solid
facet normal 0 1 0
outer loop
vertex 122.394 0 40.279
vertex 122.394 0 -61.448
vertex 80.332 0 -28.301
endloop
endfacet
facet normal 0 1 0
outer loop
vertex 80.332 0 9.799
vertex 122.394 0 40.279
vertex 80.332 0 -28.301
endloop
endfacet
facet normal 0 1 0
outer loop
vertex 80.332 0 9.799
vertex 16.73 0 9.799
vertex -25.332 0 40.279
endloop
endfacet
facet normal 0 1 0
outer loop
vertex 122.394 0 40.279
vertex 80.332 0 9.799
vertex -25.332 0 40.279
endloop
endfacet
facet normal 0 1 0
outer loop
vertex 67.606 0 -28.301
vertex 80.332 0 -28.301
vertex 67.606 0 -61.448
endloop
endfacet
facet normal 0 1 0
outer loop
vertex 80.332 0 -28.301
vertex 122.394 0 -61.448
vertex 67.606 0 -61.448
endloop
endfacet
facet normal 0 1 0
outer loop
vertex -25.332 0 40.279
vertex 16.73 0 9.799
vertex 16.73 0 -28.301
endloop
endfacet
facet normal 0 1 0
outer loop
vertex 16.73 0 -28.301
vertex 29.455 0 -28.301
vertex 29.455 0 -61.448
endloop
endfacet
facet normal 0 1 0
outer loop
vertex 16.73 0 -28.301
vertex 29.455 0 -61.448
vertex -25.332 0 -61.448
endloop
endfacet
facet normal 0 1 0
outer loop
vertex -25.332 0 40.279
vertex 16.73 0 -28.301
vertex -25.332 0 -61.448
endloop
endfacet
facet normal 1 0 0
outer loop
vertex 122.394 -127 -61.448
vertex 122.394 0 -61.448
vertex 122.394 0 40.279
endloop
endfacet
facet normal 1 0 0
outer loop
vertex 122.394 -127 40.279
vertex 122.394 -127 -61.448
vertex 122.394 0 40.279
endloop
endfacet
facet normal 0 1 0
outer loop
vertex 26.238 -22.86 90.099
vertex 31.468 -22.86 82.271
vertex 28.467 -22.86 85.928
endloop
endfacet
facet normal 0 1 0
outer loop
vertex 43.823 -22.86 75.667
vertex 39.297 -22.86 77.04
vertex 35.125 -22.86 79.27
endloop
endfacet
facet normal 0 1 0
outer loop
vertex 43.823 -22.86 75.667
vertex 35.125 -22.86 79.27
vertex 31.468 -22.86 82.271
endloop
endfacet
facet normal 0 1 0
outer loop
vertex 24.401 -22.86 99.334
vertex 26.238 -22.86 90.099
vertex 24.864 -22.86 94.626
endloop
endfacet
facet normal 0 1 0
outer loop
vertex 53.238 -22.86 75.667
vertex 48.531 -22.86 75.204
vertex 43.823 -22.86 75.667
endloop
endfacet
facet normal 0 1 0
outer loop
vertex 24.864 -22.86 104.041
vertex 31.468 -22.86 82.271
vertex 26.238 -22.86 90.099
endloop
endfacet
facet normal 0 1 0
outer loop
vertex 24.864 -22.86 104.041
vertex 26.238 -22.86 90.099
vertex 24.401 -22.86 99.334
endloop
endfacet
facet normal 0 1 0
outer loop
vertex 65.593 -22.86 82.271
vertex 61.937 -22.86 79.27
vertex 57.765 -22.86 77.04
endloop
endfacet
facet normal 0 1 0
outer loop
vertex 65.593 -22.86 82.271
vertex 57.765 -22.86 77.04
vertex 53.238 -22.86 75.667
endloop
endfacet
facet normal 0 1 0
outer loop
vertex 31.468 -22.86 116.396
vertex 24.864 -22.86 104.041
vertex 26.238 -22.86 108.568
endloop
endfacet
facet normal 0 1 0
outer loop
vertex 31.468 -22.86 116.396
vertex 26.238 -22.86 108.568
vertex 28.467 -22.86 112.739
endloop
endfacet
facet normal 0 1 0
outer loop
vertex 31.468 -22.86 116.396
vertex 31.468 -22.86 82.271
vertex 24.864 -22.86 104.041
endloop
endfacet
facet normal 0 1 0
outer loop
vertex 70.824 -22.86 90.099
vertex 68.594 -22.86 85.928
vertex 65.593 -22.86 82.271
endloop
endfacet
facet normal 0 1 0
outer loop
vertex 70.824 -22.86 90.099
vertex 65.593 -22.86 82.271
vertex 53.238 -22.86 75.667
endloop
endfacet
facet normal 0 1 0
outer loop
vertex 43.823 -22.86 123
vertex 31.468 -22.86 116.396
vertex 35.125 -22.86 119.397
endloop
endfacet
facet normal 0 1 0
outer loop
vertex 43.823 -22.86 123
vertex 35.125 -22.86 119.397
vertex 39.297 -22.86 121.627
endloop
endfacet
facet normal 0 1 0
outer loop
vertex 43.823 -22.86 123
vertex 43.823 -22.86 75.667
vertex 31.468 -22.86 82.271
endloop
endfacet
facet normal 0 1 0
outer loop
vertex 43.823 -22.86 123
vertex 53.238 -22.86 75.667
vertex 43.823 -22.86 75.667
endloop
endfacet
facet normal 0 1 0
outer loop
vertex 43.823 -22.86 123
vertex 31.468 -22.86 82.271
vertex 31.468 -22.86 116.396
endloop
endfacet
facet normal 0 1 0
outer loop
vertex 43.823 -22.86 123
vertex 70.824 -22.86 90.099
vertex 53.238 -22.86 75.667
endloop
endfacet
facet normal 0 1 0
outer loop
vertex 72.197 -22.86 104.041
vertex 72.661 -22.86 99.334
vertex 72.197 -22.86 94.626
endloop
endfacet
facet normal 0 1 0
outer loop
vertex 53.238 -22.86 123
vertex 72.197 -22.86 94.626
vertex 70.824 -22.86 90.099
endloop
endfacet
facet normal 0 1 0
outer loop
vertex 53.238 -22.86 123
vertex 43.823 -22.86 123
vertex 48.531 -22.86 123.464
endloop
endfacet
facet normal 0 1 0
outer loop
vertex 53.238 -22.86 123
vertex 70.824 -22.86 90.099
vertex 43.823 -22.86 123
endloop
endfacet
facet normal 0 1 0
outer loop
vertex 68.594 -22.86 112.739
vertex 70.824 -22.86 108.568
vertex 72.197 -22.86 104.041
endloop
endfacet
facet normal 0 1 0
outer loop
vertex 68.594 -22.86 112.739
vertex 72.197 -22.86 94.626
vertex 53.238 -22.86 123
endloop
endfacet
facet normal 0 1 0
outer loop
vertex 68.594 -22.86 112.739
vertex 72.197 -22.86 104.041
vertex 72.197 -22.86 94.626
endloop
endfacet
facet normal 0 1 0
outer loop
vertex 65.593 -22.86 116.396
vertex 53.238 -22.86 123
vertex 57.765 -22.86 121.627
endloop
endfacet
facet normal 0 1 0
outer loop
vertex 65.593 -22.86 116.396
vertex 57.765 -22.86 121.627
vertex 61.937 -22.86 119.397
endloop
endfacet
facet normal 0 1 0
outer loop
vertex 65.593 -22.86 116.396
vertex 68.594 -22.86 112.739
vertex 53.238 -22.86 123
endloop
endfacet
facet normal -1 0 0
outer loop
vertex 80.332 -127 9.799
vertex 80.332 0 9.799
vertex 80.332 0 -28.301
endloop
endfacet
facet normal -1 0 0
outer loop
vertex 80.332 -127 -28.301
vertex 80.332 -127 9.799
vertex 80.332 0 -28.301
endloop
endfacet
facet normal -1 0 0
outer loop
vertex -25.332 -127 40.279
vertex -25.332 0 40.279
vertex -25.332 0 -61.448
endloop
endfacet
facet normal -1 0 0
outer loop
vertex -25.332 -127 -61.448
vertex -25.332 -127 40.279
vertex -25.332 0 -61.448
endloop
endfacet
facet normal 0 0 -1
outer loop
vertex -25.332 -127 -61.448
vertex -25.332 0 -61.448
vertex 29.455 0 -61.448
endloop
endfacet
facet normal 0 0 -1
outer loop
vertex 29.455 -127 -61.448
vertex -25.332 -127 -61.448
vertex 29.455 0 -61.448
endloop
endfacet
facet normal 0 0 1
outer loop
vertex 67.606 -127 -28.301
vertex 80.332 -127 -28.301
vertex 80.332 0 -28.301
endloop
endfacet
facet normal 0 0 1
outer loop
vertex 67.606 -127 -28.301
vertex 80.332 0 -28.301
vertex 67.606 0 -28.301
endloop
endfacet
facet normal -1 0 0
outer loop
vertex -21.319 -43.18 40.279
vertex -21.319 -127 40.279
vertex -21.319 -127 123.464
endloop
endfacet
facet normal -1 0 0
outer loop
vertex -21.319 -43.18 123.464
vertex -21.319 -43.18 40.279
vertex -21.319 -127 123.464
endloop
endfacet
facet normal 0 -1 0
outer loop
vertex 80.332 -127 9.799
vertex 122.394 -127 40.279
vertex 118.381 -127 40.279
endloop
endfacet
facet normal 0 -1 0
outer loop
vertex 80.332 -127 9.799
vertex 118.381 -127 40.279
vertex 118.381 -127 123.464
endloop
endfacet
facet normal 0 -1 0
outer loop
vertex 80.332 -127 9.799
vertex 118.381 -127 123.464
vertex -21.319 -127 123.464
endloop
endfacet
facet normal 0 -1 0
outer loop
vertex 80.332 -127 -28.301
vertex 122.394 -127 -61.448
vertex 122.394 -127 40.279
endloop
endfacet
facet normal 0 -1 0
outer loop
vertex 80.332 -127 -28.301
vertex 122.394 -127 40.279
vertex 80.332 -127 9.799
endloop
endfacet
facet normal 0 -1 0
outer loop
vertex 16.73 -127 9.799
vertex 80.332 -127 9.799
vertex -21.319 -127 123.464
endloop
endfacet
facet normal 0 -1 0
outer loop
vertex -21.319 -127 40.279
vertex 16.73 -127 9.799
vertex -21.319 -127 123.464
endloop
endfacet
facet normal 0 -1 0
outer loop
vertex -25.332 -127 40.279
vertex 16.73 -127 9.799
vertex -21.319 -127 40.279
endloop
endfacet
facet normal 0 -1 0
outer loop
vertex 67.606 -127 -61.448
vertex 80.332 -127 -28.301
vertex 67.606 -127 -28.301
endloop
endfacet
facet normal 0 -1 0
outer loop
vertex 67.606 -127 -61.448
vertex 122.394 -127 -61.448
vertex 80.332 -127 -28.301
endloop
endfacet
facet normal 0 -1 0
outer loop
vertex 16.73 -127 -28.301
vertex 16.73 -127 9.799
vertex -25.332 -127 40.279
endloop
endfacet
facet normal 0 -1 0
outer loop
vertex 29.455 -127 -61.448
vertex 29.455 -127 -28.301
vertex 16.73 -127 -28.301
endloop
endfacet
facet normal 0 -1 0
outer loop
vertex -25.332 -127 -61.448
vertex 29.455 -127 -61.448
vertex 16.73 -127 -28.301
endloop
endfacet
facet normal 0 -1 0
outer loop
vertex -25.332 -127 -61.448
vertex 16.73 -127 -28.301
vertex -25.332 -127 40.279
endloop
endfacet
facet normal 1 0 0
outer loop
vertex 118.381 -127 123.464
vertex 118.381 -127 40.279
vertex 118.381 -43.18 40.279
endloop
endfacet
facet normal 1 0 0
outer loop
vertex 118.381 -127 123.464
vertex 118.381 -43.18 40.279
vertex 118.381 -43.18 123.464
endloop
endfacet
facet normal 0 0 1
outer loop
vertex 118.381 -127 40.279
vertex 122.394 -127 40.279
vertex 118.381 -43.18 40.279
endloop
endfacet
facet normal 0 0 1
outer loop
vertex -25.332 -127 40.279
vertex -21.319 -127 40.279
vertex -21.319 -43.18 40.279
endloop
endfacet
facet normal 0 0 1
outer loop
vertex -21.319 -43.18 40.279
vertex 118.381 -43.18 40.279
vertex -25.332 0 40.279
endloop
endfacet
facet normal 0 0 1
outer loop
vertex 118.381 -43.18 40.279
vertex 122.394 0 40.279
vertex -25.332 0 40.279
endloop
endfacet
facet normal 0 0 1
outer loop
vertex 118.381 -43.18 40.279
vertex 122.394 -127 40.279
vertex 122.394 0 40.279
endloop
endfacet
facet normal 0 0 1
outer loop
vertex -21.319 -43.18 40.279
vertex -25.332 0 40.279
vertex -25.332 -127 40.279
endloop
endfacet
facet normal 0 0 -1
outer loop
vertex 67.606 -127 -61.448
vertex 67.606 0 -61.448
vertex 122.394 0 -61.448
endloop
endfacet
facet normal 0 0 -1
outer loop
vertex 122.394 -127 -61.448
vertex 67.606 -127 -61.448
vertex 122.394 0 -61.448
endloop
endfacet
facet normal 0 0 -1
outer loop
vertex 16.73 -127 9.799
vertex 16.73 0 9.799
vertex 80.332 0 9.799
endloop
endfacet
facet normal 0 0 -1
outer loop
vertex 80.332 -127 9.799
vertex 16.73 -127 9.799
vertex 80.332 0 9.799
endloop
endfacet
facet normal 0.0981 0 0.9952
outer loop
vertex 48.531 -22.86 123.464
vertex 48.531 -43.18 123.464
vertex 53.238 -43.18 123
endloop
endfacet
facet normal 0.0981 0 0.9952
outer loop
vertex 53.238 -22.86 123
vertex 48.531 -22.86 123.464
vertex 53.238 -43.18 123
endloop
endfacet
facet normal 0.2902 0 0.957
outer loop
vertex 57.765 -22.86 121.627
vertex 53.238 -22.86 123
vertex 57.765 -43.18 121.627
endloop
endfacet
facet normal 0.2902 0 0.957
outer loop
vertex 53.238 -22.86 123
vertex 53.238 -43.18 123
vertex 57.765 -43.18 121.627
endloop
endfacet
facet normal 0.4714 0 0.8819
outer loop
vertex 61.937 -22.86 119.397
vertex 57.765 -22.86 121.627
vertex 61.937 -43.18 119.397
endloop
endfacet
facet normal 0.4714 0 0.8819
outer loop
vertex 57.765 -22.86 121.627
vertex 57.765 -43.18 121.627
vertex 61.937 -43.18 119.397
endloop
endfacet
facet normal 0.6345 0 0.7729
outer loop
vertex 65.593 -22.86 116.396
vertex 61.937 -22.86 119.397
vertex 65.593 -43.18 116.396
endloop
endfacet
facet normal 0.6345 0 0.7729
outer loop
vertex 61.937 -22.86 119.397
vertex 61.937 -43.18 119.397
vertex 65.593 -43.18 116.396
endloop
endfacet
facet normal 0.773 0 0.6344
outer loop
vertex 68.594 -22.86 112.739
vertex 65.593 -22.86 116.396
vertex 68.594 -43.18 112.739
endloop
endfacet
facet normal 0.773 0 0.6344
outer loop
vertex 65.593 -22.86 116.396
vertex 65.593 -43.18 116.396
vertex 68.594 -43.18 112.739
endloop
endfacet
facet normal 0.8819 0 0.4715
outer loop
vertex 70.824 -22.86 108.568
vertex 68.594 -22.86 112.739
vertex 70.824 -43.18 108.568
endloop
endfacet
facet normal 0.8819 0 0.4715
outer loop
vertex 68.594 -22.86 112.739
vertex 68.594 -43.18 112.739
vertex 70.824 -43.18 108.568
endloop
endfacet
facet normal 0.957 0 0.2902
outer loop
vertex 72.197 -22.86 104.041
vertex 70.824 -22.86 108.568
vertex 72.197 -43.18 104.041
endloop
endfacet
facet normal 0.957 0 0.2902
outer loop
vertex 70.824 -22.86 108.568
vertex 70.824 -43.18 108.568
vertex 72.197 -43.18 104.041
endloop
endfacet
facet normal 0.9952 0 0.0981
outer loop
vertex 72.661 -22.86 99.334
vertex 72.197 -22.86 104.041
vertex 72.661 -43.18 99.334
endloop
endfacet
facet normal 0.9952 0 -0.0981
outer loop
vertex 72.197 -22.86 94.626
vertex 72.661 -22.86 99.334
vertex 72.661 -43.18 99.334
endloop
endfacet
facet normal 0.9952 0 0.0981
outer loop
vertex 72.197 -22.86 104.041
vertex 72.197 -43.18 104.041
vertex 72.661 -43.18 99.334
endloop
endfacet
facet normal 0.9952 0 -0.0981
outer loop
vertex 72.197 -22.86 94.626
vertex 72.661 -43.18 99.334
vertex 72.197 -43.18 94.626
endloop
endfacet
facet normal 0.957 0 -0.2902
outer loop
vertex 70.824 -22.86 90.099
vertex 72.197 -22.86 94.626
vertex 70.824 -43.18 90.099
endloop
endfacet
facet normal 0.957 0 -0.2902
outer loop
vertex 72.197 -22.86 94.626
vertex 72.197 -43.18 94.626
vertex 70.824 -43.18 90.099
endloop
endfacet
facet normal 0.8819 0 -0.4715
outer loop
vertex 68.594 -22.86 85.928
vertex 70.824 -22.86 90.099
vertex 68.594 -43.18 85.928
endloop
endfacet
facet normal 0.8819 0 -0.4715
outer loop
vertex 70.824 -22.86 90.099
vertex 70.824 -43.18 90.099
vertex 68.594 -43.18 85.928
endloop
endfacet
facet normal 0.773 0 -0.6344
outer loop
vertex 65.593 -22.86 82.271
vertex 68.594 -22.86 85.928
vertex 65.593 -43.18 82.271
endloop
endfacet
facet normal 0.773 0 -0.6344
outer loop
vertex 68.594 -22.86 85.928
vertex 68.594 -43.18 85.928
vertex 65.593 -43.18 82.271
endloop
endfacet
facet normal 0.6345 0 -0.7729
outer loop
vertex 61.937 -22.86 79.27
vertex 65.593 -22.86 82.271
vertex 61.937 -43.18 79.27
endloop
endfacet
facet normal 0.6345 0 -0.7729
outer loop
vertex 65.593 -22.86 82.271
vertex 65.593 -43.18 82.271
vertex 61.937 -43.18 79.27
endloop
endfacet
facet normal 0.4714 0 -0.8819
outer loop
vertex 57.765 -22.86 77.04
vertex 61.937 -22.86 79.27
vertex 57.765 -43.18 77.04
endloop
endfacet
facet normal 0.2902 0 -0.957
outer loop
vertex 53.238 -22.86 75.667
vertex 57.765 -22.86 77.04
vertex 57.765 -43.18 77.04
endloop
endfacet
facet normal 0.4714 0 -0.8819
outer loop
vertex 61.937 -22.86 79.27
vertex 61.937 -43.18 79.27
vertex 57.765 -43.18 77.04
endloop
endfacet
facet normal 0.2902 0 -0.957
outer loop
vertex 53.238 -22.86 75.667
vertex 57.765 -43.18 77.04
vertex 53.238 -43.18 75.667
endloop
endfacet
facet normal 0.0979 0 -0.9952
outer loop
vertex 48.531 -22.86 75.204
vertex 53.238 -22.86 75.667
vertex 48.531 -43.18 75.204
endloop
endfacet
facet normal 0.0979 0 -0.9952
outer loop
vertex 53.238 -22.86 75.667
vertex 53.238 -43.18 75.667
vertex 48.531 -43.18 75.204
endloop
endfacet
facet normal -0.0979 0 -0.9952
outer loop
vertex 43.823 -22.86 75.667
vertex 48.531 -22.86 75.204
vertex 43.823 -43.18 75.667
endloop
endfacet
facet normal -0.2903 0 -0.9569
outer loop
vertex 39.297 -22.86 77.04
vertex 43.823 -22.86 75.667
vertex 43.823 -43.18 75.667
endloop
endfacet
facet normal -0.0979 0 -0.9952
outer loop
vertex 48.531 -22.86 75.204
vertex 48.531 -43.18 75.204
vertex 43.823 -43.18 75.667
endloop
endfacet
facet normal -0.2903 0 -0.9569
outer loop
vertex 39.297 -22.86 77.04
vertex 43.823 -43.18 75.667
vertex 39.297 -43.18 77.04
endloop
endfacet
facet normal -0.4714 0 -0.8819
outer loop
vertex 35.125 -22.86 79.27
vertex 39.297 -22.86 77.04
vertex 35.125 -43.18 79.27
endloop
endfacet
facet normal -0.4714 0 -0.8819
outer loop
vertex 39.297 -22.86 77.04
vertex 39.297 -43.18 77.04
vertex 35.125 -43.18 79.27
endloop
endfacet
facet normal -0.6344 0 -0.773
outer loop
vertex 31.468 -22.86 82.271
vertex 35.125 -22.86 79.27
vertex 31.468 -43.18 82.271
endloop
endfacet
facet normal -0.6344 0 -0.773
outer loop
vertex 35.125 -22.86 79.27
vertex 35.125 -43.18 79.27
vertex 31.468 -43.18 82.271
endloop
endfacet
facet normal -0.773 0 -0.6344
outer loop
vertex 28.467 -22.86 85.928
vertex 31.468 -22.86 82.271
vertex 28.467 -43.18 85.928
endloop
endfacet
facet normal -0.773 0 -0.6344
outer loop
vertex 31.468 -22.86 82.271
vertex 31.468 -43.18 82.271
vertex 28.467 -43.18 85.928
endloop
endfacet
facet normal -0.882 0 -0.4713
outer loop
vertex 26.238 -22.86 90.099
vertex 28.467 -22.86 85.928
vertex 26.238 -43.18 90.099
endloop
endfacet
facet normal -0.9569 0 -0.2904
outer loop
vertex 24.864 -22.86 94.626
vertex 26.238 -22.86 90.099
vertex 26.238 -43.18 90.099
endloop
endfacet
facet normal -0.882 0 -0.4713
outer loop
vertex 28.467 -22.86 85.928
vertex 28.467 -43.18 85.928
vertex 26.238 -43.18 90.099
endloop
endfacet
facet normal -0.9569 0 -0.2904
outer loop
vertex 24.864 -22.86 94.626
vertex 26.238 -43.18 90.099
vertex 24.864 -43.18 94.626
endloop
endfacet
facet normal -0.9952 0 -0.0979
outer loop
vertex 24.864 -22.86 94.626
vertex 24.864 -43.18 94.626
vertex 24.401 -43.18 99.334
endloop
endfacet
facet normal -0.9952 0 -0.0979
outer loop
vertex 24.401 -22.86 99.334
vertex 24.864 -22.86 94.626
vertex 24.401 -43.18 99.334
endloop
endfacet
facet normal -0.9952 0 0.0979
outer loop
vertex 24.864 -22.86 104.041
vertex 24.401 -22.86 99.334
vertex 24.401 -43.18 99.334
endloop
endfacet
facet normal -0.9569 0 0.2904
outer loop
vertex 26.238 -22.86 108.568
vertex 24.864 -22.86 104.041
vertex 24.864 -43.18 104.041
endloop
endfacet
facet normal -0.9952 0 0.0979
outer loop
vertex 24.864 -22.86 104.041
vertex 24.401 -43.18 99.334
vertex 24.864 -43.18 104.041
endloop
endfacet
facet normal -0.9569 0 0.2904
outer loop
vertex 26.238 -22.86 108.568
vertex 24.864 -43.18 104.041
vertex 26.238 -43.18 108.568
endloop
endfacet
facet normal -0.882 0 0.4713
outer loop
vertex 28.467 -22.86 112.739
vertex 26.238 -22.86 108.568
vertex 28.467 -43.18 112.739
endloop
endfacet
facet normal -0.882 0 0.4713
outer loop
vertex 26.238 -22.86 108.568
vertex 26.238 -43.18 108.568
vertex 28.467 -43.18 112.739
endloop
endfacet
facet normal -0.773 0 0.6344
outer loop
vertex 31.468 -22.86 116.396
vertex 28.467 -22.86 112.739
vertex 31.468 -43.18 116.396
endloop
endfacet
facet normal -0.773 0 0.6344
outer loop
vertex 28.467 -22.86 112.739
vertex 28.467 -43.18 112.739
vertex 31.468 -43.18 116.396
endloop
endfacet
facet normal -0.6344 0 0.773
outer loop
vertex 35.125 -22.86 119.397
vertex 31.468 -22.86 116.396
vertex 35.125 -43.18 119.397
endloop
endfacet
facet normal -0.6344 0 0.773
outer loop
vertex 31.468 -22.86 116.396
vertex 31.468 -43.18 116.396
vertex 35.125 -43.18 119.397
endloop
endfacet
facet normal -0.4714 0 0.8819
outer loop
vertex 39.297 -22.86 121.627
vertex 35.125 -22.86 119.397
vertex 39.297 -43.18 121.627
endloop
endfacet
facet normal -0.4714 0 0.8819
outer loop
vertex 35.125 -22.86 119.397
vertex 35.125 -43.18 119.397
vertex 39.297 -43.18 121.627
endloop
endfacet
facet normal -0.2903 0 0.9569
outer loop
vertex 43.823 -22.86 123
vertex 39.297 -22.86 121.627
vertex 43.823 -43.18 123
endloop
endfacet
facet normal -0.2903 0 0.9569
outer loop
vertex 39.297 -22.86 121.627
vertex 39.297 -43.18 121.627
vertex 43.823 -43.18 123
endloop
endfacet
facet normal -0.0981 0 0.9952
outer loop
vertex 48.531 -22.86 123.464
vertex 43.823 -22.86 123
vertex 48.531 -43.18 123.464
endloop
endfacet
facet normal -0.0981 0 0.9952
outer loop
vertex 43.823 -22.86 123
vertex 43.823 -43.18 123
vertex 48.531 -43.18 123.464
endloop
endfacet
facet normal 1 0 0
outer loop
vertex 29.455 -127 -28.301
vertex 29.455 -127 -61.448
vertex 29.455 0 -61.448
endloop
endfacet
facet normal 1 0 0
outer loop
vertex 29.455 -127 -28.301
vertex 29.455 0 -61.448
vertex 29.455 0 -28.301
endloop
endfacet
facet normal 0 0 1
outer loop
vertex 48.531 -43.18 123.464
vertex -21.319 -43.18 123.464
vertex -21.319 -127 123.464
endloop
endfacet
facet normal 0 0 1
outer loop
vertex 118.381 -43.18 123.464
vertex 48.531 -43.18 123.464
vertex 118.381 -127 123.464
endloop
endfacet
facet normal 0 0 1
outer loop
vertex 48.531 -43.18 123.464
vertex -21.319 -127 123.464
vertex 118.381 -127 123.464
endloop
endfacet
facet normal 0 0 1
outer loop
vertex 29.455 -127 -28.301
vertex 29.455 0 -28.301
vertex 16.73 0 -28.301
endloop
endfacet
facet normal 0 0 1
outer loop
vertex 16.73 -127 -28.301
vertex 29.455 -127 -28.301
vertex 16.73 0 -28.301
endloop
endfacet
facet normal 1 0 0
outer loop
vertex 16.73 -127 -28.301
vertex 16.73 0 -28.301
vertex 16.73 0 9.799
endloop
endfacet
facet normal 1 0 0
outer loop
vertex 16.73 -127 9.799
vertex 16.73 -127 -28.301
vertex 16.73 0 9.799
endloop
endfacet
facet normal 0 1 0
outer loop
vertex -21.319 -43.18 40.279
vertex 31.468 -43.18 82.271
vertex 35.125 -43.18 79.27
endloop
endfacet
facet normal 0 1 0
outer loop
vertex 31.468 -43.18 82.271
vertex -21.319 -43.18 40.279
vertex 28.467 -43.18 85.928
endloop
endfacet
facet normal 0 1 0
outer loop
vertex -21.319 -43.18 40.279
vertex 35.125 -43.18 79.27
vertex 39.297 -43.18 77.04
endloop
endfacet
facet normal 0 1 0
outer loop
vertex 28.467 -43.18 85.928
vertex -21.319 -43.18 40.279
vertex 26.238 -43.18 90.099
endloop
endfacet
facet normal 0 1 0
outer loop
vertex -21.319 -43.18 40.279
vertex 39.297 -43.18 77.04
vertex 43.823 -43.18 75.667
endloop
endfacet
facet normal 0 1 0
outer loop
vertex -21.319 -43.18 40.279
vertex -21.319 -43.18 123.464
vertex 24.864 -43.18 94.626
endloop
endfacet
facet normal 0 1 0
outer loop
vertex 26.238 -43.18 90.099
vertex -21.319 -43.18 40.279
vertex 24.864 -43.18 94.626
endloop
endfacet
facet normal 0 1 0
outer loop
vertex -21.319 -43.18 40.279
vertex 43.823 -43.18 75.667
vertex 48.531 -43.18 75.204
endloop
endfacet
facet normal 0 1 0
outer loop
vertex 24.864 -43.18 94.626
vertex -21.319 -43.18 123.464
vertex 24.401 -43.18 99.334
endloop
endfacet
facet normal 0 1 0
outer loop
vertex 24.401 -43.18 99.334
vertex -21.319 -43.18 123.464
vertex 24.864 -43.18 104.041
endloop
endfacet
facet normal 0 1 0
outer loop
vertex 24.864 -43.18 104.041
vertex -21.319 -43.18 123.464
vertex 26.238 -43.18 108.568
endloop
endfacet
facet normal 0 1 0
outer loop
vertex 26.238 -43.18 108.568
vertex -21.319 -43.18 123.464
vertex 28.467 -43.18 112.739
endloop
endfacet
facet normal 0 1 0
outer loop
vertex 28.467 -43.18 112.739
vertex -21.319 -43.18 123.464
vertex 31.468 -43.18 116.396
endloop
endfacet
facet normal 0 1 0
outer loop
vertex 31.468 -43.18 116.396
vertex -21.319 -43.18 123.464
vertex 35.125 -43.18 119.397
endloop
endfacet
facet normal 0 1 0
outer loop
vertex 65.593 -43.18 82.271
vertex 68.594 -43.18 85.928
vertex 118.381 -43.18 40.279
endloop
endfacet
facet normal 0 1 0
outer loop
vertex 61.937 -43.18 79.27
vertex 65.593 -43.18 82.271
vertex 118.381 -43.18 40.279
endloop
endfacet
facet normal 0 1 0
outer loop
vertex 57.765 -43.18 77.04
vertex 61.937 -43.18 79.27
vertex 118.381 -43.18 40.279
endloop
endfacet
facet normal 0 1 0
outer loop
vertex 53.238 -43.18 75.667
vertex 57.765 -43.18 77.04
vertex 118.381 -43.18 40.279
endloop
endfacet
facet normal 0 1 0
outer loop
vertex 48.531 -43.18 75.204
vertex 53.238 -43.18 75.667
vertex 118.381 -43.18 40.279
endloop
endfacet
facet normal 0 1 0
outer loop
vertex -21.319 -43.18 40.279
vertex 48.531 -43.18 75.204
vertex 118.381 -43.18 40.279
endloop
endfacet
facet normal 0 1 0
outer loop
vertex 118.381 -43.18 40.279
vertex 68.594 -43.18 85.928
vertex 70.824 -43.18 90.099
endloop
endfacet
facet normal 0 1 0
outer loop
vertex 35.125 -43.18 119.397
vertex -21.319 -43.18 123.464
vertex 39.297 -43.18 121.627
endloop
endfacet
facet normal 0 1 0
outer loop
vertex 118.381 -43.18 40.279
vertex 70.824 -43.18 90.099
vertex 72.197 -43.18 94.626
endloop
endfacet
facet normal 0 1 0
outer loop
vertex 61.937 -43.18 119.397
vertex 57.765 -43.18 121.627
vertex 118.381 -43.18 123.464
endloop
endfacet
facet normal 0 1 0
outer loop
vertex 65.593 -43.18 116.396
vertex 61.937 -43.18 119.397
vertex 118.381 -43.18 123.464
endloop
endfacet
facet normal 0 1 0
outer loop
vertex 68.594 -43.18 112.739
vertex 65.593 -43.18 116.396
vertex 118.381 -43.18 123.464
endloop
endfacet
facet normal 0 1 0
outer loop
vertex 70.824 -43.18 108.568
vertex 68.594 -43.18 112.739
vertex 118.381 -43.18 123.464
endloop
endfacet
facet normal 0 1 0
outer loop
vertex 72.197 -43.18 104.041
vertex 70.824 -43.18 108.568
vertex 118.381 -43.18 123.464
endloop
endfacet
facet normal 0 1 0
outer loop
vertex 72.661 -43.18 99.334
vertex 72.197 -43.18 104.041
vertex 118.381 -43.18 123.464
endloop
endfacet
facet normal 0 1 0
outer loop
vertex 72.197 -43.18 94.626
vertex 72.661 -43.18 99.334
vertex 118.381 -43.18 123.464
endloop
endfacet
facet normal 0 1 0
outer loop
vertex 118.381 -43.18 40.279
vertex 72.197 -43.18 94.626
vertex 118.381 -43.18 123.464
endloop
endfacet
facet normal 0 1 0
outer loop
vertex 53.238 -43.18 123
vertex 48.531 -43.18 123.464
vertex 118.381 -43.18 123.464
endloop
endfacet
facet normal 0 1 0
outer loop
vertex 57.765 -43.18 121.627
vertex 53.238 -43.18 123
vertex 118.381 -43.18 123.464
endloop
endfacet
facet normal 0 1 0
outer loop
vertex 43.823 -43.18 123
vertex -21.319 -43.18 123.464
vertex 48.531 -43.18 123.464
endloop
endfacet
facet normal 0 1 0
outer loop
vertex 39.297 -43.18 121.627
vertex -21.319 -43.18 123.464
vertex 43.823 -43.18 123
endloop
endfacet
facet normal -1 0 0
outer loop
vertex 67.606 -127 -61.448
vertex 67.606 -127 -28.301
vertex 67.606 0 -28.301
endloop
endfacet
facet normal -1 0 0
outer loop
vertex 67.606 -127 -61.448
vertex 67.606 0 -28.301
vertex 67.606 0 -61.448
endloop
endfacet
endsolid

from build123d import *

# Parameters (mm, degrees)
BOSS_EXTRUDE1_DEPTH = 127
SKETCH2_W           = 139.7
SKETCH2_H           = 83.185
BOSS_EXTRUDE2_DEPTH = 83.82
SKETCH3_R           = 24.13
BOSS_EXTRUDE3_DEPTH = 20.32


with BuildPart() as part:
    # Sketch1 → Boss-Extrude1 (new body)
    with BuildSketch(Plane(origin=(0, 0, 0), x_dir=(1, 0, 0), z_dir=(0, 1, 0))):
        Polygon((16.729923946, 28.301454676), (16.729923946, -9.798545324), (80.331523946, -9.798545324), (80.331523946, 28.301454676), (67.606123946, 28.301454676), (67.606123946, 61.448454676), (122.393923946, 61.448454676), (122.393923946, -40.278545324), (-25.332476054, -40.278545324), (-25.332476054, 61.448454676), (29.455323946, 61.448454676), (29.455323946, 28.301454676), align=None)
    extrude(amount=-BOSS_EXTRUDE1_DEPTH)

    # Sketch2 → Boss-Extrude2 (add)
    with BuildSketch(Plane.XZ.offset(127)):
        with Locations((48.530723946, 81.871045324)):
            Rectangle(SKETCH2_W, SKETCH2_H)
    extrude(amount=-BOSS_EXTRUDE2_DEPTH)

    # Sketch3 → Boss-Extrude3 (add)
    with BuildSketch(Plane(origin=(0, -43.18, 0), x_dir=(1, 0, 0), z_dir=(0, 1, 0))):
        with Locations(Location((48.530723946, -99.333545324, 0), (0, 0, 270))):
            Circle(SKETCH3_R)
    extrude(amount=BOSS_EXTRUDE3_DEPTH)


solid = part.part
